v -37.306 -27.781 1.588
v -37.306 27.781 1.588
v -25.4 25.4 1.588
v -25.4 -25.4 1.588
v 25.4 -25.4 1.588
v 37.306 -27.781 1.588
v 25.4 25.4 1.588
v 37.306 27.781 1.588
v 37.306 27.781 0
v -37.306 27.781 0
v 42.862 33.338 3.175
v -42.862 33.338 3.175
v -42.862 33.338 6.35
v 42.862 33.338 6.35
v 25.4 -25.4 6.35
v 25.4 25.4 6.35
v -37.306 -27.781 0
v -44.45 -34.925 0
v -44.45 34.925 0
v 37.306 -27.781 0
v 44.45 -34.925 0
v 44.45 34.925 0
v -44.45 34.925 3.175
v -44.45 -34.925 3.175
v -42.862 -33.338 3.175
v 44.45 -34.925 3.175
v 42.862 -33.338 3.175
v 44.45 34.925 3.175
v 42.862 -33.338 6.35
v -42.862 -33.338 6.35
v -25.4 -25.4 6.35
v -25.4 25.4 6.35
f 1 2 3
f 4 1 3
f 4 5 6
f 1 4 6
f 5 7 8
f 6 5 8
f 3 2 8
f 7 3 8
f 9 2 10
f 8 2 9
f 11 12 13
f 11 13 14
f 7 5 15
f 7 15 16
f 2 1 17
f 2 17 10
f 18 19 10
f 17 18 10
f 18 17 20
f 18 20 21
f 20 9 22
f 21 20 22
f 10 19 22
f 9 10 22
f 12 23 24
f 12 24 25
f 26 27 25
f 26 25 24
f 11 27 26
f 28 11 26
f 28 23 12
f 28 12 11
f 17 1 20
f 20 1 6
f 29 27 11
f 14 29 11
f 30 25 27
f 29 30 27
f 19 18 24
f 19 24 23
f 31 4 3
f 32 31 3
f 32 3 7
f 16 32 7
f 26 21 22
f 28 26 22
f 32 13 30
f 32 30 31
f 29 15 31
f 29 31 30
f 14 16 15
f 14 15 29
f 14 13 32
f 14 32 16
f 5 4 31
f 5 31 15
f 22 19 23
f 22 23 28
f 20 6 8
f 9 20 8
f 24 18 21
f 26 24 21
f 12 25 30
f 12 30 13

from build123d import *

# Parameters (mm, degrees)
F0_W     = 88.9
F0_H     = 69.85
F0_W_2   = 85.725
F0_H_2   = 66.675
F1_DEPTH = 3.175
F0_W_3   = 74.6125
F0_H_3   = 55.5625
F2_DEPTH = 6.35
F0_W_4   = 50.8
F0_H_4   = 50.8
F3_DEPTH = 6.35
F4_DEPTH = 1.5875


with BuildPart() as f1:
    # F0 (on Top) → F1 (new body)
    with BuildSketch(Plane.XY):
        Rectangle(F0_W, F0_H)
        Rectangle(F0_W_2, F0_H_2, mode=Mode.SUBTRACT)
    extrude(amount=F1_DEPTH)

    # F0 (on Top) → F2 (join)
    with BuildSketch(Plane.XY):
        Rectangle(F0_W_2, F0_H_2)
        Rectangle(F0_W_3, F0_H_3, mode=Mode.SUBTRACT)
    extrude(amount=F2_DEPTH)

    # F0 (on Top) → F3 (join)
    with BuildSketch(Plane.XY):
        Rectangle(F0_W_3, F0_H_3)
        Rectangle(F0_W_4, F0_H_4, mode=Mode.SUBTRACT)
    extrude(amount=F3_DEPTH)

    # F0 (on Top) → F4 (cut, symmetric)
    with BuildSketch(Plane.XY):
        Rectangle(F0_W_3, F0_H_3)
        Rectangle(F0_W_4, F0_H_4, mode=Mode.SUBTRACT)
    extrude(amount=F4_DEPTH, both=True, mode=Mode.SUBTRACT)


solid = f1.part
